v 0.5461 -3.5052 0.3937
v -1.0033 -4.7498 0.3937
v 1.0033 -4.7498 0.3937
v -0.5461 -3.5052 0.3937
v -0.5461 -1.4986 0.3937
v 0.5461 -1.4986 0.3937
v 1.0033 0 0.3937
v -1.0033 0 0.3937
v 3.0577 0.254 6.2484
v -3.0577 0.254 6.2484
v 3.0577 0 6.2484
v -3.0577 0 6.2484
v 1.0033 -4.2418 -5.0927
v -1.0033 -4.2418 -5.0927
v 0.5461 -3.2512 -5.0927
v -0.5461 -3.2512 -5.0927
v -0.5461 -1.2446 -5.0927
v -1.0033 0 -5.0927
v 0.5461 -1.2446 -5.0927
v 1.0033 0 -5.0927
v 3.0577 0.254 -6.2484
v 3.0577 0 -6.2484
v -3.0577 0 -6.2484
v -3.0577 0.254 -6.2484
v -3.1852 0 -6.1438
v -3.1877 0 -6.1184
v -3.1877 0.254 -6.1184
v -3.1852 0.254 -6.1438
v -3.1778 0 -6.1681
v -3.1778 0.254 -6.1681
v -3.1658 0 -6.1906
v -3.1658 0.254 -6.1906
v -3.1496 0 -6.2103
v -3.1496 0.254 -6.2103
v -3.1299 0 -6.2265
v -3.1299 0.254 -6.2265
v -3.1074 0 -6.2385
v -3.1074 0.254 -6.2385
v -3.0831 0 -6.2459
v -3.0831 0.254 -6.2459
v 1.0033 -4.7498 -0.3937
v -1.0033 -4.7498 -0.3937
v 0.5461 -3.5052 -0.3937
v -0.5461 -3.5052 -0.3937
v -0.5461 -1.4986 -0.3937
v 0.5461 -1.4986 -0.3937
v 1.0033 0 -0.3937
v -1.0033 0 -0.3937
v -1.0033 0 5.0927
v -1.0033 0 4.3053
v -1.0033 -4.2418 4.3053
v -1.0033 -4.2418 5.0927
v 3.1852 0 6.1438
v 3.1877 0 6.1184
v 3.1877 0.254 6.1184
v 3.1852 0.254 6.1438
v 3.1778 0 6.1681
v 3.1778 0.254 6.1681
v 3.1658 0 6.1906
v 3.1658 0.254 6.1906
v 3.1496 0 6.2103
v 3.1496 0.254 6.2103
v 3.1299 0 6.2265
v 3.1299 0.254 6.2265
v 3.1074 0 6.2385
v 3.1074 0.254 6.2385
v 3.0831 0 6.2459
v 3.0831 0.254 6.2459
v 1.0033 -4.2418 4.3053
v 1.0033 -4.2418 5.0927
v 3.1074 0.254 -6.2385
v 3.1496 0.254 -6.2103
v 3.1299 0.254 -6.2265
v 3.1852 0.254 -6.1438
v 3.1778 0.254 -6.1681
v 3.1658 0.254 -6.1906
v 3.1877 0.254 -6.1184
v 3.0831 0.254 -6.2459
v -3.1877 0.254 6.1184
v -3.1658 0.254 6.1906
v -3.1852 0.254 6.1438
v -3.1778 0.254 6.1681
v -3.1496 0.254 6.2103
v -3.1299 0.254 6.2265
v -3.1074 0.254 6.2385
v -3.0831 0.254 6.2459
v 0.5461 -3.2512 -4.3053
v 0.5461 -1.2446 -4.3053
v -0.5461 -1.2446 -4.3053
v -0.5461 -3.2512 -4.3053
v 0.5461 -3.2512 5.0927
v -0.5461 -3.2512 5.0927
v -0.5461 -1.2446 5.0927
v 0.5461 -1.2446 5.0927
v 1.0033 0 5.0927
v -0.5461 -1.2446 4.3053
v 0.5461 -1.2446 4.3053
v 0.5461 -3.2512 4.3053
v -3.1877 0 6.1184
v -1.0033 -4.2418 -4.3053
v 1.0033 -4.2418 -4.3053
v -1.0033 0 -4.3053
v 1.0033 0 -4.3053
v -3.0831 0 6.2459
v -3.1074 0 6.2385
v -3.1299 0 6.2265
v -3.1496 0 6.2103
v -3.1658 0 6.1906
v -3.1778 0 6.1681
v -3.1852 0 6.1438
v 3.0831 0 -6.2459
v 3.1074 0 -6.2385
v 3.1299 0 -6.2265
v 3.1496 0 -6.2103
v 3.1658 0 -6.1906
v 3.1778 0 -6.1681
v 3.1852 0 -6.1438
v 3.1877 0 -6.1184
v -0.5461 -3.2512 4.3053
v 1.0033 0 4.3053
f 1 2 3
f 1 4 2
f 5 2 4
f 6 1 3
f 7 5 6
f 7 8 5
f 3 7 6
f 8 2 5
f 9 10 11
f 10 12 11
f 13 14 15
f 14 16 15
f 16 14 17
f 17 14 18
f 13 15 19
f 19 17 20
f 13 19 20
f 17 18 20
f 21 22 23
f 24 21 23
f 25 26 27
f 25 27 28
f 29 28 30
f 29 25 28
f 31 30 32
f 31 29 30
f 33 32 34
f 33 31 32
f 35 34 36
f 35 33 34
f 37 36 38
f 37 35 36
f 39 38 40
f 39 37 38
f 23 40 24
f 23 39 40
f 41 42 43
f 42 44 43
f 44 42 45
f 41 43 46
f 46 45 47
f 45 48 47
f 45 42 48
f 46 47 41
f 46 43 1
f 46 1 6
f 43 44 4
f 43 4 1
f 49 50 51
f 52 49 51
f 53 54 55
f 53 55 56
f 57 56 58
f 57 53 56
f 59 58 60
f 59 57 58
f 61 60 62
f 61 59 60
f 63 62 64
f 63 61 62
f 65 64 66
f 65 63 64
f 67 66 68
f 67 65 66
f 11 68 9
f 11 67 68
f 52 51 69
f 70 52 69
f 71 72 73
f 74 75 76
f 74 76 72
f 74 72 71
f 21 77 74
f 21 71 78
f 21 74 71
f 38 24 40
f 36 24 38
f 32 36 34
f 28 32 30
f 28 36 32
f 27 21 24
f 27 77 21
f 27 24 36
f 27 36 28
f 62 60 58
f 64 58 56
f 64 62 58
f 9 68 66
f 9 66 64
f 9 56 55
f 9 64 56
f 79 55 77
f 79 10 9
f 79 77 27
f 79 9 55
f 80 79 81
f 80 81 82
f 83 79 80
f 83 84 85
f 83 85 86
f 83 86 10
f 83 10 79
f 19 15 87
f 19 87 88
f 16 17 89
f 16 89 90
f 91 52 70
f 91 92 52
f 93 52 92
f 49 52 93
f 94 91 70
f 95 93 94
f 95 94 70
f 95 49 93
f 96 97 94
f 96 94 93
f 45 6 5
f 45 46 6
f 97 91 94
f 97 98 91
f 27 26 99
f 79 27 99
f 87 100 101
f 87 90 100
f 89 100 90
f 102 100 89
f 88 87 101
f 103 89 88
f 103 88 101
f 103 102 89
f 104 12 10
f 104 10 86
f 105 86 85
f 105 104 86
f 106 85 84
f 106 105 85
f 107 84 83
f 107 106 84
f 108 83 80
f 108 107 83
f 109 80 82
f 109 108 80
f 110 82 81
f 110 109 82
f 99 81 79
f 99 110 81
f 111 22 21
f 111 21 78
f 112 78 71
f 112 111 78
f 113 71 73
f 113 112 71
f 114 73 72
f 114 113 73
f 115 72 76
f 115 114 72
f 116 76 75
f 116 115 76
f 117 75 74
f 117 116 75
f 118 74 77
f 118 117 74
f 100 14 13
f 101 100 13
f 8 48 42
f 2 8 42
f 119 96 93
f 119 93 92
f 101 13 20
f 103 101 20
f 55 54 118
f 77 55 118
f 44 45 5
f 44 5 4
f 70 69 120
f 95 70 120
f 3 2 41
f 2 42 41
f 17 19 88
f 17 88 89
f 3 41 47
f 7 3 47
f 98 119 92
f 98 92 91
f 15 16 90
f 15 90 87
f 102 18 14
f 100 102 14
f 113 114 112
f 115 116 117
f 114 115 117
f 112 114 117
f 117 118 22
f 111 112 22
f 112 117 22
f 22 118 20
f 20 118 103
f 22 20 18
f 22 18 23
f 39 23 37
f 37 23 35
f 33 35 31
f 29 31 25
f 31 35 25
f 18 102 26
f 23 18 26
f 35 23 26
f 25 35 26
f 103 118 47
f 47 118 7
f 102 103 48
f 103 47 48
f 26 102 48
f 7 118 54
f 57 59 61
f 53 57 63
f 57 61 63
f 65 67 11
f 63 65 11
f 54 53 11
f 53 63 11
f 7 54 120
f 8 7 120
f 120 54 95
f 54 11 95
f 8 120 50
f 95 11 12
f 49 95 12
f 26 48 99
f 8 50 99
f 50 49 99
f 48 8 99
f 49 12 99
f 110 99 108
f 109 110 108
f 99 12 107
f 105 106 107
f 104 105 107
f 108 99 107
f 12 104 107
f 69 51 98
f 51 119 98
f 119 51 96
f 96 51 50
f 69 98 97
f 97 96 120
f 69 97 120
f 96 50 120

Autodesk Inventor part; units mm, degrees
sketch "Sketch_2" plane through (0, 0, 0) normal (0, 1, 0) x (-1, 0, 0)
  line L0 (3.1877, -6.1184) -> (3.1877, 6.1184)
  arc A0 (3.1877, 6.1184) -> (3.0577, 6.2484) centre (3.0577, 6.1184) ccw
  line L1 (3.0577, 6.2484) -> (-3.0577, 6.2484)
  arc A1 (-3.0577, 6.2484) -> (-3.1877, 6.1184) centre (-3.0577, 6.1184) ccw
  line L2 (-3.1877, 6.1184) -> (-3.1877, -6.1184)
  arc A2 (-3.1877, -6.1184) -> (-3.0577, -6.2484) centre (-3.0577, -6.1184) ccw
  line L3 (-3.0577, -6.2484) -> (3.0577, -6.2484)
  arc A3 (3.0577, -6.2484) -> (3.1877, -6.1184) centre (3.0577, -6.1184) ccw
extrude "Extrusion1" add sketch "Sketch_2" along normal blind 0.254
sketch "Sketch_1" plane through (0, 0, -4.699) normal (0, 0, 1) x (1, 0, 0)
  line L0 (-1.0033, 0) -> (-1.0033, -4.2418)
  line L1 (-1.0033, -4.2418) -> (1.0033, -4.2418)
  line L2 (1.0033, -4.2418) -> (1.0033, 0)
  line L3 (1.0033, 0) -> (-1.0033, 0)
  line L4 (-0.5461, -1.2446) -> (-0.5461, -3.2512)
  line L5 (-0.5461, -3.2512) -> (0.5461, -3.2512)
  line L6 (0.5461, -3.2512) -> (0.5461, -1.2446)
  line L7 (0.5461, -1.2446) -> (-0.5461, -1.2446)
extrude "Extrusion2" add sketch "Sketch_1" along normal mid plane 0.7874
pattern_linear "Rectangular Pattern1" count 2 spacing 9.398 along (0, 0, 1) of "Extrusion2"
sketch "Sketch_14" plane through (0, 0, 0) normal (0, 0, 1) x (1, 0, 0)
  line L0 (-1.0033, 0) -> (-1.0033, -4.7498)
  line L1 (-1.0033, -4.7498) -> (1.0033, -4.7498)
  line L2 (1.0033, -4.7498) -> (1.0033, 0)
  line L3 (1.0033, 0) -> (-1.0033, 0)
  line L4 (-0.5461, -1.4986) -> (-0.5461, -3.5052)
  line L5 (-0.5461, -3.5052) -> (0.5461, -3.5052)
  line L6 (0.5461, -3.5052) -> (0.5461, -1.4986)
  line L7 (0.5461, -1.4986) -> (-0.5461, -1.4986)
extrude "Extrusion3" add sketch "Sketch_14" along normal mid plane 0.7874
ref_plane "to_base_XY" through (0, 0, 0) normal (0, 1, 0) x (1, 0, 0)
ref_plane "to_base_YZ" through (0, 0, 0) normal (1, 0, 0) x (0, 0, -1)
ref_plane "to_base_ZX" through (0, 0, 0) normal (0, 0, -1) x (0, 1, 0)
properties part number "M201901-terminals"
